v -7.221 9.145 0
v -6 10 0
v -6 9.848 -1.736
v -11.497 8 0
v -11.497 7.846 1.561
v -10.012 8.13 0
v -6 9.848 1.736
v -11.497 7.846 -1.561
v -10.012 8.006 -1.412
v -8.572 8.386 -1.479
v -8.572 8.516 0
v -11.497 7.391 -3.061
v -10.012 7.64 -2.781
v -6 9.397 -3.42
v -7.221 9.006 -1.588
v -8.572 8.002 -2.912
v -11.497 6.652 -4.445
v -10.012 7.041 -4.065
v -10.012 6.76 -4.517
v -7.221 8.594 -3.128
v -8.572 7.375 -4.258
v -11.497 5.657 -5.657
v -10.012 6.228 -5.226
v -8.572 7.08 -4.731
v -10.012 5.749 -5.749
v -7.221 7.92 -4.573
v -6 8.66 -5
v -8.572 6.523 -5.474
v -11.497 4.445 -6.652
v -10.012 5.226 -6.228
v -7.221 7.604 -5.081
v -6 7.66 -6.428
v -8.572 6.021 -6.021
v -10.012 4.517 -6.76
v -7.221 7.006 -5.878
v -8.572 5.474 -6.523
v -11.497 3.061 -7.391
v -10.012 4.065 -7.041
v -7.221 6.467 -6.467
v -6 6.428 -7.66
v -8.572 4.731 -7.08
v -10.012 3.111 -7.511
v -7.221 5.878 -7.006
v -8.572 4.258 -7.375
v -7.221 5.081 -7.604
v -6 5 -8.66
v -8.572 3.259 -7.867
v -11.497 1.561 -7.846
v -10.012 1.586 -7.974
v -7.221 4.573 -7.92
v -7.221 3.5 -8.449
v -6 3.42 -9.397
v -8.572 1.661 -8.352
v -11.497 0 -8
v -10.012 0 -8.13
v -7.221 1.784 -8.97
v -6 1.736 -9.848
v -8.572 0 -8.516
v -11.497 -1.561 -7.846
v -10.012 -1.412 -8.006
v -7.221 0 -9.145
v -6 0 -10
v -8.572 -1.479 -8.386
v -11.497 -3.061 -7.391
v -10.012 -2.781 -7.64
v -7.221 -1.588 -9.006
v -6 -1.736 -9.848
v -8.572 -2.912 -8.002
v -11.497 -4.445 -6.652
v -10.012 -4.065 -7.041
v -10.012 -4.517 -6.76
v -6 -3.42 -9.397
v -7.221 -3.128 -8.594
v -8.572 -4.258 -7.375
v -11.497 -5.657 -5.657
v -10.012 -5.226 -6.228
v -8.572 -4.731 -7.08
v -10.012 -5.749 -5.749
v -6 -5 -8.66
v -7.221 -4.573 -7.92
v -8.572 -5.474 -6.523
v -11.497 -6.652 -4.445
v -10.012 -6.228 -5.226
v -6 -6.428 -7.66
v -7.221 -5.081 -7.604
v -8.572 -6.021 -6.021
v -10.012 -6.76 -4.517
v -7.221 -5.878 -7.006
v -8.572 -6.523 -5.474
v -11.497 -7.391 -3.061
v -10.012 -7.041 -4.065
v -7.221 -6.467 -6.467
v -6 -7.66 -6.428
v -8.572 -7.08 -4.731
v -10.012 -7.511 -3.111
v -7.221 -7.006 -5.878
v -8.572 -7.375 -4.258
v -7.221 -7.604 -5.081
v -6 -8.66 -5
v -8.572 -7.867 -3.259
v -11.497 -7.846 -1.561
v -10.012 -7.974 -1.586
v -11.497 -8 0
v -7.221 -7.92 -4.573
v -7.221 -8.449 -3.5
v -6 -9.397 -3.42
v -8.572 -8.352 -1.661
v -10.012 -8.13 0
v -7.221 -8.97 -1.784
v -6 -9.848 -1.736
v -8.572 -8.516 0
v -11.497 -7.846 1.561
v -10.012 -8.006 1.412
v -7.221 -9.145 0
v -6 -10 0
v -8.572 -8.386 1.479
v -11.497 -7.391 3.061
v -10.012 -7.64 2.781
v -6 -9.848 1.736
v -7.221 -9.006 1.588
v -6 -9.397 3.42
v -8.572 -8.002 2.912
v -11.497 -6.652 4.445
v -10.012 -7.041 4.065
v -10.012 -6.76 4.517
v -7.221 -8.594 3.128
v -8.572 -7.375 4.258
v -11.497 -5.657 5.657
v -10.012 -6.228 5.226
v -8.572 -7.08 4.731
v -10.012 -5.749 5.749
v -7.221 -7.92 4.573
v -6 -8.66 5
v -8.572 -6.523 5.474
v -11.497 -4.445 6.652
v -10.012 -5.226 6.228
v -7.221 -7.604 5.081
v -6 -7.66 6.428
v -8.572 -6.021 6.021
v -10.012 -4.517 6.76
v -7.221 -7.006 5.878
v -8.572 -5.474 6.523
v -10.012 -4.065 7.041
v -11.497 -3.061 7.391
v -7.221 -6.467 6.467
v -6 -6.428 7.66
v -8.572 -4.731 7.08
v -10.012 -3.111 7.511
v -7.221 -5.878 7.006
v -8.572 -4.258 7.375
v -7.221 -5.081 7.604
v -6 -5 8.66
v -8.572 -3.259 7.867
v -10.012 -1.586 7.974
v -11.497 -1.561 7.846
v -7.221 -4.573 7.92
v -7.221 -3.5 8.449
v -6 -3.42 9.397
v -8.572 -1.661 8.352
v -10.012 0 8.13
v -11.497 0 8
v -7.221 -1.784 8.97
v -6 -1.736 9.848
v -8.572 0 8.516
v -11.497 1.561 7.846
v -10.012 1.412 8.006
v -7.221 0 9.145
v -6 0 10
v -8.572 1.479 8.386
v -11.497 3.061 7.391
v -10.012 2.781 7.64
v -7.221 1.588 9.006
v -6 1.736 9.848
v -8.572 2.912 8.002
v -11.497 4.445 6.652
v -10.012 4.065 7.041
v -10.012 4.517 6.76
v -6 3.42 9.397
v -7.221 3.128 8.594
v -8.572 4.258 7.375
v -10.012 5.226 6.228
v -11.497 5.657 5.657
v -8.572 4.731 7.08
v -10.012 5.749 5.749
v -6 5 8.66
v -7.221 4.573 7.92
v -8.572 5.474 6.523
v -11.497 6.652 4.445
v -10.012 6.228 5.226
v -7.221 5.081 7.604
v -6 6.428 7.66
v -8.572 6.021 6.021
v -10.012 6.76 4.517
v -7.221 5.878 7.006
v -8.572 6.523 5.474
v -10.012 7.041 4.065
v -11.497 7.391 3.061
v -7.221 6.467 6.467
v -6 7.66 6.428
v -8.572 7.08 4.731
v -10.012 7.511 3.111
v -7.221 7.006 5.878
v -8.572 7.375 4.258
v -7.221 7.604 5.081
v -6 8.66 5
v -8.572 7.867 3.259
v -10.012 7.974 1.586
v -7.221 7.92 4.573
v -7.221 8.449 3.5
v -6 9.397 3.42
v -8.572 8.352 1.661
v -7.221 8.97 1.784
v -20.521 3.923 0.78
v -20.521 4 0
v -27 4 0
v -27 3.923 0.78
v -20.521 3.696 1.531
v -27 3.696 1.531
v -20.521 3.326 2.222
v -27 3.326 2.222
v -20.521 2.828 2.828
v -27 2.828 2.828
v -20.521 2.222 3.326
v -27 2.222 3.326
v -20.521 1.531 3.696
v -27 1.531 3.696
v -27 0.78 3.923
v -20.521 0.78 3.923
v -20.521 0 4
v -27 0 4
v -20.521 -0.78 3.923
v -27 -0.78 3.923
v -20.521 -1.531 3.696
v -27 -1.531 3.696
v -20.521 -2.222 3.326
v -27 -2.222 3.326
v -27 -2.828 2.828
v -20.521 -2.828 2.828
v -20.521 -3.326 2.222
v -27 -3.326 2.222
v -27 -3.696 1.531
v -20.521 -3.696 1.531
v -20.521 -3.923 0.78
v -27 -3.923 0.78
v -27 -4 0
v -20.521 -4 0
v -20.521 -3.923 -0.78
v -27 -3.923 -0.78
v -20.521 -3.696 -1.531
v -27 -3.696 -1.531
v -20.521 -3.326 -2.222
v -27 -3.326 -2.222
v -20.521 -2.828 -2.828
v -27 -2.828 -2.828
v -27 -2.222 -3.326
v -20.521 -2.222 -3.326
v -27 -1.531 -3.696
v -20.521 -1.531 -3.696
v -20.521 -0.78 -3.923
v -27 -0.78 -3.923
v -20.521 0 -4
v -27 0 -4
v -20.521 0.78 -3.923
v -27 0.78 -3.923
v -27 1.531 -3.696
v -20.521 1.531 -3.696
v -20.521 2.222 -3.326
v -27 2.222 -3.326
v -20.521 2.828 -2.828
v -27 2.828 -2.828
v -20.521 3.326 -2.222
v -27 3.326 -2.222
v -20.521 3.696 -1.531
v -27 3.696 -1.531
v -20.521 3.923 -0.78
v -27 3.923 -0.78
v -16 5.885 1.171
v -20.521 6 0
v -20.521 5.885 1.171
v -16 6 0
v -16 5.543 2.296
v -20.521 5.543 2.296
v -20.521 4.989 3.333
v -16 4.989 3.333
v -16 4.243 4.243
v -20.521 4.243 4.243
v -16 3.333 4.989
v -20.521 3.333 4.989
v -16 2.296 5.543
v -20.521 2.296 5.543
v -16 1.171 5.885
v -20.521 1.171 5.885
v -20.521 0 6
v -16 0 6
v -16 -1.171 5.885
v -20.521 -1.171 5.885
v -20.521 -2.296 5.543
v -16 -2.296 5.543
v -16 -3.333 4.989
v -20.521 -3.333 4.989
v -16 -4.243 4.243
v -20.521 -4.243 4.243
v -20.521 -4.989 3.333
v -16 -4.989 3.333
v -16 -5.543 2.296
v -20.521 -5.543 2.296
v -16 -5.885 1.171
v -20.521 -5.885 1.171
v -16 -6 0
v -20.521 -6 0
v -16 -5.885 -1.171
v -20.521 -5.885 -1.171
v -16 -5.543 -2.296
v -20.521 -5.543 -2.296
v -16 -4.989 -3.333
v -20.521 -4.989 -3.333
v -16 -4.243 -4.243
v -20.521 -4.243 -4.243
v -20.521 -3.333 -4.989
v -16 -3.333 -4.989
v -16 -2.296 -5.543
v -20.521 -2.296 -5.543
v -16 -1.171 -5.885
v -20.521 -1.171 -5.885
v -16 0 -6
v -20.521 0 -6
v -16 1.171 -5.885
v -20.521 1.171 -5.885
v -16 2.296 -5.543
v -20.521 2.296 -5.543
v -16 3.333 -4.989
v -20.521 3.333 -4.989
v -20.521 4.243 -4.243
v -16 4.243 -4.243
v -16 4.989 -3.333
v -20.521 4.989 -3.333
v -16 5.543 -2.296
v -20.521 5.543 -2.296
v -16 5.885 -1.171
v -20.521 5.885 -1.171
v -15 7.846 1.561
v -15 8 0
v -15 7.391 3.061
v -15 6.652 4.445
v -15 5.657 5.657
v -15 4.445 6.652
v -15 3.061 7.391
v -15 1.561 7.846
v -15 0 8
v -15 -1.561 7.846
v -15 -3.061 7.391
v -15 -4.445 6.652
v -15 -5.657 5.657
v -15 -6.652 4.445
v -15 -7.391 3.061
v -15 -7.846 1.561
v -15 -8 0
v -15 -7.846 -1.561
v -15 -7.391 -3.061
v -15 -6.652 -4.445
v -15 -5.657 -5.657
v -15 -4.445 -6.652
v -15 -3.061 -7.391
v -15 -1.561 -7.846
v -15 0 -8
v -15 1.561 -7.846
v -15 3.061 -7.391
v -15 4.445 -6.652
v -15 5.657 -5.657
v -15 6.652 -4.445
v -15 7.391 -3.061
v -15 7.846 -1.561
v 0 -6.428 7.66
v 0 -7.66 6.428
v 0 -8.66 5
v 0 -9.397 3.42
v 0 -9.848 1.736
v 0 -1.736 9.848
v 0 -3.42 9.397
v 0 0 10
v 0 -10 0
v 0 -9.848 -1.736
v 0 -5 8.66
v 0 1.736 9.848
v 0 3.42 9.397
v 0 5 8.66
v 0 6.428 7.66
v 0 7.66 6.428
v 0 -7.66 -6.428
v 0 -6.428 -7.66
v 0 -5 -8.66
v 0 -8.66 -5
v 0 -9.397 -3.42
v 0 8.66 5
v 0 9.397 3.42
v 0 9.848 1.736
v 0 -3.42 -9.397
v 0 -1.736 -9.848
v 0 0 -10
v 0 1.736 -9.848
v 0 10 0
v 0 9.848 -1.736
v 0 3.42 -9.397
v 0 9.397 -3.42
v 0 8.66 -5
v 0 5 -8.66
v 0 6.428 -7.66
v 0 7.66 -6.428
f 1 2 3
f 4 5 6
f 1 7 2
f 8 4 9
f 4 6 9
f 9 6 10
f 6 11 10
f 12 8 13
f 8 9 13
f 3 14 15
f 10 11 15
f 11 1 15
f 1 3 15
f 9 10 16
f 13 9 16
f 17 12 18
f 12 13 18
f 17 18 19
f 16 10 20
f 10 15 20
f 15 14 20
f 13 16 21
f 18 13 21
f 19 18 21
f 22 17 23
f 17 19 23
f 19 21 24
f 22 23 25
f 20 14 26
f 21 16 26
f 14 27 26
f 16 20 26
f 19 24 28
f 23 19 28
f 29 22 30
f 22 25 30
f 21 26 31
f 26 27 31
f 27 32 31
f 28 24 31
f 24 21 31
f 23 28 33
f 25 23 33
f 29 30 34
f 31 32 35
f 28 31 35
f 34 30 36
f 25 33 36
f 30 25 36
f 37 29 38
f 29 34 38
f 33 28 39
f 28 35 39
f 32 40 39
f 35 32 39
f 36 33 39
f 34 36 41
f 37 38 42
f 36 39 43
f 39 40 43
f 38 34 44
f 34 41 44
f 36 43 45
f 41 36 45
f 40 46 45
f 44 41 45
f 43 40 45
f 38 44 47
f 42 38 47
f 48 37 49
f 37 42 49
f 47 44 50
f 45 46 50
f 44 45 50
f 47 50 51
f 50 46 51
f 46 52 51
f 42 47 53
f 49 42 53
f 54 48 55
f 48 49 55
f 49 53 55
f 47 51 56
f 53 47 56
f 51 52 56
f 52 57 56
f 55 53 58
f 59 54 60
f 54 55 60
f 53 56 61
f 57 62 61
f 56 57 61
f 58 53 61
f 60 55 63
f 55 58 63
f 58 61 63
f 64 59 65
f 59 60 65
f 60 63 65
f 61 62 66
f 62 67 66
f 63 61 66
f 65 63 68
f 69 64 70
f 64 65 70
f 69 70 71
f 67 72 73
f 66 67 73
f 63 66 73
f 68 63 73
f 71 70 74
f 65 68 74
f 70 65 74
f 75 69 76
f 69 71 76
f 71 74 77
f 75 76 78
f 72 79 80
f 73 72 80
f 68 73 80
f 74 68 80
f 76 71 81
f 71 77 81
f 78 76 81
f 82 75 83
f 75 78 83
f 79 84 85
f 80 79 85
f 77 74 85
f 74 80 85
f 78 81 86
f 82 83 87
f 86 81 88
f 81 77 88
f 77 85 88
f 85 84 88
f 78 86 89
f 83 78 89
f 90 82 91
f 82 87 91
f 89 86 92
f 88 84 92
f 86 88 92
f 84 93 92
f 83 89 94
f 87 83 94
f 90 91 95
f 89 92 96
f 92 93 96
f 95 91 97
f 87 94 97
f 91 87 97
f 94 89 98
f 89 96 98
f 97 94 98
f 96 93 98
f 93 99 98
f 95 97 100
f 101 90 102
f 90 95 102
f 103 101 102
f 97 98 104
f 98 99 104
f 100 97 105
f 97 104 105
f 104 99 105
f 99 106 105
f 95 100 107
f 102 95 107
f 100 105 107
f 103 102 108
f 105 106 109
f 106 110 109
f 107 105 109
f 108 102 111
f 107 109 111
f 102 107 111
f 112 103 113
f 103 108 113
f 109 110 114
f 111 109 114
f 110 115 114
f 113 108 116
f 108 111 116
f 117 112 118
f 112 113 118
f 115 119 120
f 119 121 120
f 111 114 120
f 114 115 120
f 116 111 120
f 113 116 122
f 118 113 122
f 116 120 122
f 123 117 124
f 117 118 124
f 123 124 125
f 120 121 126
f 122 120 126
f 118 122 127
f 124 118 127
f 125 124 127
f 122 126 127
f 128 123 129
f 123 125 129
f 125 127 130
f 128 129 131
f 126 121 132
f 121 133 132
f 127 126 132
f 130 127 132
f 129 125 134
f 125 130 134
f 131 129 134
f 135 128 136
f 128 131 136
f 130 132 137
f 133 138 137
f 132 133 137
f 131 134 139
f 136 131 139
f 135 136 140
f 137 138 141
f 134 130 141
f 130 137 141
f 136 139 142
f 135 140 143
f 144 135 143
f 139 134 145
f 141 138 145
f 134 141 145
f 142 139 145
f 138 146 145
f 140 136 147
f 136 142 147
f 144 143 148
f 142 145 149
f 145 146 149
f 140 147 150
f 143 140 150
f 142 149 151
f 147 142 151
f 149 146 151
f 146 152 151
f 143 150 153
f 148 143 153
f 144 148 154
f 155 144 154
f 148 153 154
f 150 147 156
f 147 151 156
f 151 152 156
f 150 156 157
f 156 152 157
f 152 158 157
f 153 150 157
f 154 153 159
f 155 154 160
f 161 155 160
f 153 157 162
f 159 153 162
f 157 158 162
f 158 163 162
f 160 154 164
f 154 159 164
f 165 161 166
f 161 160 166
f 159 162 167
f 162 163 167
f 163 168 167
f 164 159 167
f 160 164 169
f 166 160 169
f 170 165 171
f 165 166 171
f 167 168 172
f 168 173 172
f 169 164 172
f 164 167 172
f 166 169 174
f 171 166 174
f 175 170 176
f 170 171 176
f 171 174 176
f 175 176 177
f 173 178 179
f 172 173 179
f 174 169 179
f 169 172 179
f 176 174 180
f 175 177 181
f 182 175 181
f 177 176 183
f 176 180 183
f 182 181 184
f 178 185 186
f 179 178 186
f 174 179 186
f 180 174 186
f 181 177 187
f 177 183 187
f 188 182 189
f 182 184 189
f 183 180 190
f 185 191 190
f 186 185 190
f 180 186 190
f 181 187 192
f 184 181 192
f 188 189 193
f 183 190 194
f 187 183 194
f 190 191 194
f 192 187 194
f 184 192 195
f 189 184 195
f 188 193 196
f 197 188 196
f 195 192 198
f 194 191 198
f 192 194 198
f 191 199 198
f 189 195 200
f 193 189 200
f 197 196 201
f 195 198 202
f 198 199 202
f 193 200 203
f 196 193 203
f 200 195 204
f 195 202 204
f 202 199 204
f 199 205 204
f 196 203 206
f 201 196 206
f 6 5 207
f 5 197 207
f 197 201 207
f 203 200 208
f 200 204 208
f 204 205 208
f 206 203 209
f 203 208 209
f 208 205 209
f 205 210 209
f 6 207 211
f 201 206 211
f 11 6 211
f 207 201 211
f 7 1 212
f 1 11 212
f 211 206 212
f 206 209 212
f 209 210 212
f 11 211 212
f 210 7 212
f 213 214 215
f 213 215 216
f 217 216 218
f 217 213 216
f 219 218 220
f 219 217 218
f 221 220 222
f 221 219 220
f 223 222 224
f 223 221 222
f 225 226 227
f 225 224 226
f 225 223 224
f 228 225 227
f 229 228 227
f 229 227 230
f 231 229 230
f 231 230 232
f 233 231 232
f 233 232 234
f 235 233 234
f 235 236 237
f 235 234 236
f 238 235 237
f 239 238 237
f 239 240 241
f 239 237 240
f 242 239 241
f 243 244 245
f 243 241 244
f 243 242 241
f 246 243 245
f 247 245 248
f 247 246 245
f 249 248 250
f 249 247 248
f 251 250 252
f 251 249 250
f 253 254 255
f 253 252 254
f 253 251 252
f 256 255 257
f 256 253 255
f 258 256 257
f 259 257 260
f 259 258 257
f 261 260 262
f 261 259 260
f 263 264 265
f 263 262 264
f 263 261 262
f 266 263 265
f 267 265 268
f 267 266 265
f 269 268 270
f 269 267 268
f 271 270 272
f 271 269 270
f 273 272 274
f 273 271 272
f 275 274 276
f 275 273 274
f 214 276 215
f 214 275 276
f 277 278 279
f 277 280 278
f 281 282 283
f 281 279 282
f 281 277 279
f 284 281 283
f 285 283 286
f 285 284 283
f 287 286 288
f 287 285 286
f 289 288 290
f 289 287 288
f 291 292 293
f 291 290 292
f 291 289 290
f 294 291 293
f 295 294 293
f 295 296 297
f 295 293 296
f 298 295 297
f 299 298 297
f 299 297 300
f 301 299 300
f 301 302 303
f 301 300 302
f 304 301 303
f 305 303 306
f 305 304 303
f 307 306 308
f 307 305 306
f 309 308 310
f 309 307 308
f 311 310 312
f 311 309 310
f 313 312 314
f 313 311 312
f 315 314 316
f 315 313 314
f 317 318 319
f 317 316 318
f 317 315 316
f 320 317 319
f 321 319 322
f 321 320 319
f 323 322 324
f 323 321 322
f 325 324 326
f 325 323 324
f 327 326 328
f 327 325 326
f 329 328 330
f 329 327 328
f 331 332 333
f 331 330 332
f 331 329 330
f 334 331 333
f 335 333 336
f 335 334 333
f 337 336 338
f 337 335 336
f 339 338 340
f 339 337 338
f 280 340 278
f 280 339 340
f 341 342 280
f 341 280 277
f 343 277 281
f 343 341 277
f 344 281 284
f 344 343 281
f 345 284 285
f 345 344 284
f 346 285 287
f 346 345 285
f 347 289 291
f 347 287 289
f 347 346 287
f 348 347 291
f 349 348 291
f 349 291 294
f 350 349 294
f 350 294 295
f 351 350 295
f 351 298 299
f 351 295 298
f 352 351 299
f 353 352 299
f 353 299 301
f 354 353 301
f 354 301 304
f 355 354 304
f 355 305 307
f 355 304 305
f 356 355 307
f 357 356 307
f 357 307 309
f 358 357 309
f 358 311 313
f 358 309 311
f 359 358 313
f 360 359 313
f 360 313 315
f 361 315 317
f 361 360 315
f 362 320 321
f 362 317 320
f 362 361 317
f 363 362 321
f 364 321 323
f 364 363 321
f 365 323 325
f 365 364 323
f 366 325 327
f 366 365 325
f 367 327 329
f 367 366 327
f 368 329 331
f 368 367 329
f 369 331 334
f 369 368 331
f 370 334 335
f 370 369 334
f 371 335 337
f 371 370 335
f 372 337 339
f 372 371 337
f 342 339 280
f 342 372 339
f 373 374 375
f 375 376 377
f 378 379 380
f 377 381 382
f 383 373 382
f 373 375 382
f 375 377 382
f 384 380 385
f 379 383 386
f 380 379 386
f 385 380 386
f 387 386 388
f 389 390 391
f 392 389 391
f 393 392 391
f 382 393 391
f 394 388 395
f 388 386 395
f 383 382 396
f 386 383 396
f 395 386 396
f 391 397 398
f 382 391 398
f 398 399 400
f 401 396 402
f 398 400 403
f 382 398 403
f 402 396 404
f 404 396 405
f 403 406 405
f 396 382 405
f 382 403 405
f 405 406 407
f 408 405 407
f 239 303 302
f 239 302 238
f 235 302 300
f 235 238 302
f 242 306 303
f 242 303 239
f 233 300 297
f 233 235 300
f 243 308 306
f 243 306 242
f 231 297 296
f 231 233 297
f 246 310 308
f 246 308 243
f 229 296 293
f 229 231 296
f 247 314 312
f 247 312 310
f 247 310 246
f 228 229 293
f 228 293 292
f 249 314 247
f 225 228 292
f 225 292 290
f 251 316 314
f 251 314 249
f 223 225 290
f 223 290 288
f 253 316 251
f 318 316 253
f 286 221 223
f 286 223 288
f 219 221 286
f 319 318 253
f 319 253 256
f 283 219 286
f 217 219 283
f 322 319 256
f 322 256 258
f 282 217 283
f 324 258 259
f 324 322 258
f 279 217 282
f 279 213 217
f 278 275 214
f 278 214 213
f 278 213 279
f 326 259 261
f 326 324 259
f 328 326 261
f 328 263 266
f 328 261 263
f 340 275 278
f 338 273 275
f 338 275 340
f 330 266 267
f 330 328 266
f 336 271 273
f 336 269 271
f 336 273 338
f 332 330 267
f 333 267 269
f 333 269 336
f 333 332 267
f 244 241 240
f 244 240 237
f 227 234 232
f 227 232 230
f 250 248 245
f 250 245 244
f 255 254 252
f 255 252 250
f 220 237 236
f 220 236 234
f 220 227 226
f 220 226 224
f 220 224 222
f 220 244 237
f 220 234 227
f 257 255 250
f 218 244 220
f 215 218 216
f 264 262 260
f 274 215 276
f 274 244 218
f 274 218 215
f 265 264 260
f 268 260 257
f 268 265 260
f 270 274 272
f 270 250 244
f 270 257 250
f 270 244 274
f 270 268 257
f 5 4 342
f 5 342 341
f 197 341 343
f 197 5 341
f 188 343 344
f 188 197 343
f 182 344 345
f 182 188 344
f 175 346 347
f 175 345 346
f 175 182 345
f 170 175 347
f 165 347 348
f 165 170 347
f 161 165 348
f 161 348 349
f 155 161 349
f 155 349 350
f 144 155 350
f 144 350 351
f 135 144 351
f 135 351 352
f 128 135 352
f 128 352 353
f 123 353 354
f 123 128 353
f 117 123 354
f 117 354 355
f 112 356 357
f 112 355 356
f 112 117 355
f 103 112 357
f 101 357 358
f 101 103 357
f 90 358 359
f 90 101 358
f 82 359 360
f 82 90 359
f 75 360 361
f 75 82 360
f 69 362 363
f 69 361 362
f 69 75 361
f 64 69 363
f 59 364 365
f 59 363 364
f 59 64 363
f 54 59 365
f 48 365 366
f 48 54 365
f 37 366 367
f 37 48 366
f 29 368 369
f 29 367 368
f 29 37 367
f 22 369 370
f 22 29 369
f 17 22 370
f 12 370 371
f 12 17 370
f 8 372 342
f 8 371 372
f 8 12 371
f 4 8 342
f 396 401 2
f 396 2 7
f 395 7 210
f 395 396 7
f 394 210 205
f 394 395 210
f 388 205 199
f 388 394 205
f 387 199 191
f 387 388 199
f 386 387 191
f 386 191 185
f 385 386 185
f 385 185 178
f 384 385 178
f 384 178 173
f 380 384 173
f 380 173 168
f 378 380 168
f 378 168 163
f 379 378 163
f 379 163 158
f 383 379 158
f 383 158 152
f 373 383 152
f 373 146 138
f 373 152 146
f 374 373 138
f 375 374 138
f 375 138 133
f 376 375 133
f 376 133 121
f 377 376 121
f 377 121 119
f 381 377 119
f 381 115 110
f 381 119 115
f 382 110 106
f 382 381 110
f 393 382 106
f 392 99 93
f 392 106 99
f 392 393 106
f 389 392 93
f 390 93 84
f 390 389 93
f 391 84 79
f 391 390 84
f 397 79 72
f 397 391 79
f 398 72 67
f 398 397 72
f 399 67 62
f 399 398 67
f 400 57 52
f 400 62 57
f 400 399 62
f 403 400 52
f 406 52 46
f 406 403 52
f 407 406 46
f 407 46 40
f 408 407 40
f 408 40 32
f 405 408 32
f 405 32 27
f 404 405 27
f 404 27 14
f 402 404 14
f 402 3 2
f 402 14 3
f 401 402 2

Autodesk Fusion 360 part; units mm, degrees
sketch "Sketch1" plane through (0, 0, 0) normal (0, 0, 1) x (1, 0, 0)
  line L0 (0, 0) -> (-27, 0)
  line L1 (-27, 0) -> (-27, 4)
  line L2 (-27, 4) -> (-20.5209, 4)
  line L3 (-20.5209, 4) -> (-20.5209, 6)
  line L4 (-20.5209, 6) -> (-16, 6)
  line L5 (-16, 6) -> (-15, 8)
  line L6 (-15, 8) -> (-11.4968, 8)
  arc A0 (-11.4968, 8) -> (-6, 10) centre (-11.4968, 16.5538) ccw
  line L7 (-6, 10) -> (0, 10)
  line L8 (0, 10) -> (0, 0)
  dimension "d1" = 4
  dimension "d2" = 27
revolve "Revolve1" add sketch "Sketch1" angle 360 about axis through (0, 0, 0) along (-1, 0, 0)
